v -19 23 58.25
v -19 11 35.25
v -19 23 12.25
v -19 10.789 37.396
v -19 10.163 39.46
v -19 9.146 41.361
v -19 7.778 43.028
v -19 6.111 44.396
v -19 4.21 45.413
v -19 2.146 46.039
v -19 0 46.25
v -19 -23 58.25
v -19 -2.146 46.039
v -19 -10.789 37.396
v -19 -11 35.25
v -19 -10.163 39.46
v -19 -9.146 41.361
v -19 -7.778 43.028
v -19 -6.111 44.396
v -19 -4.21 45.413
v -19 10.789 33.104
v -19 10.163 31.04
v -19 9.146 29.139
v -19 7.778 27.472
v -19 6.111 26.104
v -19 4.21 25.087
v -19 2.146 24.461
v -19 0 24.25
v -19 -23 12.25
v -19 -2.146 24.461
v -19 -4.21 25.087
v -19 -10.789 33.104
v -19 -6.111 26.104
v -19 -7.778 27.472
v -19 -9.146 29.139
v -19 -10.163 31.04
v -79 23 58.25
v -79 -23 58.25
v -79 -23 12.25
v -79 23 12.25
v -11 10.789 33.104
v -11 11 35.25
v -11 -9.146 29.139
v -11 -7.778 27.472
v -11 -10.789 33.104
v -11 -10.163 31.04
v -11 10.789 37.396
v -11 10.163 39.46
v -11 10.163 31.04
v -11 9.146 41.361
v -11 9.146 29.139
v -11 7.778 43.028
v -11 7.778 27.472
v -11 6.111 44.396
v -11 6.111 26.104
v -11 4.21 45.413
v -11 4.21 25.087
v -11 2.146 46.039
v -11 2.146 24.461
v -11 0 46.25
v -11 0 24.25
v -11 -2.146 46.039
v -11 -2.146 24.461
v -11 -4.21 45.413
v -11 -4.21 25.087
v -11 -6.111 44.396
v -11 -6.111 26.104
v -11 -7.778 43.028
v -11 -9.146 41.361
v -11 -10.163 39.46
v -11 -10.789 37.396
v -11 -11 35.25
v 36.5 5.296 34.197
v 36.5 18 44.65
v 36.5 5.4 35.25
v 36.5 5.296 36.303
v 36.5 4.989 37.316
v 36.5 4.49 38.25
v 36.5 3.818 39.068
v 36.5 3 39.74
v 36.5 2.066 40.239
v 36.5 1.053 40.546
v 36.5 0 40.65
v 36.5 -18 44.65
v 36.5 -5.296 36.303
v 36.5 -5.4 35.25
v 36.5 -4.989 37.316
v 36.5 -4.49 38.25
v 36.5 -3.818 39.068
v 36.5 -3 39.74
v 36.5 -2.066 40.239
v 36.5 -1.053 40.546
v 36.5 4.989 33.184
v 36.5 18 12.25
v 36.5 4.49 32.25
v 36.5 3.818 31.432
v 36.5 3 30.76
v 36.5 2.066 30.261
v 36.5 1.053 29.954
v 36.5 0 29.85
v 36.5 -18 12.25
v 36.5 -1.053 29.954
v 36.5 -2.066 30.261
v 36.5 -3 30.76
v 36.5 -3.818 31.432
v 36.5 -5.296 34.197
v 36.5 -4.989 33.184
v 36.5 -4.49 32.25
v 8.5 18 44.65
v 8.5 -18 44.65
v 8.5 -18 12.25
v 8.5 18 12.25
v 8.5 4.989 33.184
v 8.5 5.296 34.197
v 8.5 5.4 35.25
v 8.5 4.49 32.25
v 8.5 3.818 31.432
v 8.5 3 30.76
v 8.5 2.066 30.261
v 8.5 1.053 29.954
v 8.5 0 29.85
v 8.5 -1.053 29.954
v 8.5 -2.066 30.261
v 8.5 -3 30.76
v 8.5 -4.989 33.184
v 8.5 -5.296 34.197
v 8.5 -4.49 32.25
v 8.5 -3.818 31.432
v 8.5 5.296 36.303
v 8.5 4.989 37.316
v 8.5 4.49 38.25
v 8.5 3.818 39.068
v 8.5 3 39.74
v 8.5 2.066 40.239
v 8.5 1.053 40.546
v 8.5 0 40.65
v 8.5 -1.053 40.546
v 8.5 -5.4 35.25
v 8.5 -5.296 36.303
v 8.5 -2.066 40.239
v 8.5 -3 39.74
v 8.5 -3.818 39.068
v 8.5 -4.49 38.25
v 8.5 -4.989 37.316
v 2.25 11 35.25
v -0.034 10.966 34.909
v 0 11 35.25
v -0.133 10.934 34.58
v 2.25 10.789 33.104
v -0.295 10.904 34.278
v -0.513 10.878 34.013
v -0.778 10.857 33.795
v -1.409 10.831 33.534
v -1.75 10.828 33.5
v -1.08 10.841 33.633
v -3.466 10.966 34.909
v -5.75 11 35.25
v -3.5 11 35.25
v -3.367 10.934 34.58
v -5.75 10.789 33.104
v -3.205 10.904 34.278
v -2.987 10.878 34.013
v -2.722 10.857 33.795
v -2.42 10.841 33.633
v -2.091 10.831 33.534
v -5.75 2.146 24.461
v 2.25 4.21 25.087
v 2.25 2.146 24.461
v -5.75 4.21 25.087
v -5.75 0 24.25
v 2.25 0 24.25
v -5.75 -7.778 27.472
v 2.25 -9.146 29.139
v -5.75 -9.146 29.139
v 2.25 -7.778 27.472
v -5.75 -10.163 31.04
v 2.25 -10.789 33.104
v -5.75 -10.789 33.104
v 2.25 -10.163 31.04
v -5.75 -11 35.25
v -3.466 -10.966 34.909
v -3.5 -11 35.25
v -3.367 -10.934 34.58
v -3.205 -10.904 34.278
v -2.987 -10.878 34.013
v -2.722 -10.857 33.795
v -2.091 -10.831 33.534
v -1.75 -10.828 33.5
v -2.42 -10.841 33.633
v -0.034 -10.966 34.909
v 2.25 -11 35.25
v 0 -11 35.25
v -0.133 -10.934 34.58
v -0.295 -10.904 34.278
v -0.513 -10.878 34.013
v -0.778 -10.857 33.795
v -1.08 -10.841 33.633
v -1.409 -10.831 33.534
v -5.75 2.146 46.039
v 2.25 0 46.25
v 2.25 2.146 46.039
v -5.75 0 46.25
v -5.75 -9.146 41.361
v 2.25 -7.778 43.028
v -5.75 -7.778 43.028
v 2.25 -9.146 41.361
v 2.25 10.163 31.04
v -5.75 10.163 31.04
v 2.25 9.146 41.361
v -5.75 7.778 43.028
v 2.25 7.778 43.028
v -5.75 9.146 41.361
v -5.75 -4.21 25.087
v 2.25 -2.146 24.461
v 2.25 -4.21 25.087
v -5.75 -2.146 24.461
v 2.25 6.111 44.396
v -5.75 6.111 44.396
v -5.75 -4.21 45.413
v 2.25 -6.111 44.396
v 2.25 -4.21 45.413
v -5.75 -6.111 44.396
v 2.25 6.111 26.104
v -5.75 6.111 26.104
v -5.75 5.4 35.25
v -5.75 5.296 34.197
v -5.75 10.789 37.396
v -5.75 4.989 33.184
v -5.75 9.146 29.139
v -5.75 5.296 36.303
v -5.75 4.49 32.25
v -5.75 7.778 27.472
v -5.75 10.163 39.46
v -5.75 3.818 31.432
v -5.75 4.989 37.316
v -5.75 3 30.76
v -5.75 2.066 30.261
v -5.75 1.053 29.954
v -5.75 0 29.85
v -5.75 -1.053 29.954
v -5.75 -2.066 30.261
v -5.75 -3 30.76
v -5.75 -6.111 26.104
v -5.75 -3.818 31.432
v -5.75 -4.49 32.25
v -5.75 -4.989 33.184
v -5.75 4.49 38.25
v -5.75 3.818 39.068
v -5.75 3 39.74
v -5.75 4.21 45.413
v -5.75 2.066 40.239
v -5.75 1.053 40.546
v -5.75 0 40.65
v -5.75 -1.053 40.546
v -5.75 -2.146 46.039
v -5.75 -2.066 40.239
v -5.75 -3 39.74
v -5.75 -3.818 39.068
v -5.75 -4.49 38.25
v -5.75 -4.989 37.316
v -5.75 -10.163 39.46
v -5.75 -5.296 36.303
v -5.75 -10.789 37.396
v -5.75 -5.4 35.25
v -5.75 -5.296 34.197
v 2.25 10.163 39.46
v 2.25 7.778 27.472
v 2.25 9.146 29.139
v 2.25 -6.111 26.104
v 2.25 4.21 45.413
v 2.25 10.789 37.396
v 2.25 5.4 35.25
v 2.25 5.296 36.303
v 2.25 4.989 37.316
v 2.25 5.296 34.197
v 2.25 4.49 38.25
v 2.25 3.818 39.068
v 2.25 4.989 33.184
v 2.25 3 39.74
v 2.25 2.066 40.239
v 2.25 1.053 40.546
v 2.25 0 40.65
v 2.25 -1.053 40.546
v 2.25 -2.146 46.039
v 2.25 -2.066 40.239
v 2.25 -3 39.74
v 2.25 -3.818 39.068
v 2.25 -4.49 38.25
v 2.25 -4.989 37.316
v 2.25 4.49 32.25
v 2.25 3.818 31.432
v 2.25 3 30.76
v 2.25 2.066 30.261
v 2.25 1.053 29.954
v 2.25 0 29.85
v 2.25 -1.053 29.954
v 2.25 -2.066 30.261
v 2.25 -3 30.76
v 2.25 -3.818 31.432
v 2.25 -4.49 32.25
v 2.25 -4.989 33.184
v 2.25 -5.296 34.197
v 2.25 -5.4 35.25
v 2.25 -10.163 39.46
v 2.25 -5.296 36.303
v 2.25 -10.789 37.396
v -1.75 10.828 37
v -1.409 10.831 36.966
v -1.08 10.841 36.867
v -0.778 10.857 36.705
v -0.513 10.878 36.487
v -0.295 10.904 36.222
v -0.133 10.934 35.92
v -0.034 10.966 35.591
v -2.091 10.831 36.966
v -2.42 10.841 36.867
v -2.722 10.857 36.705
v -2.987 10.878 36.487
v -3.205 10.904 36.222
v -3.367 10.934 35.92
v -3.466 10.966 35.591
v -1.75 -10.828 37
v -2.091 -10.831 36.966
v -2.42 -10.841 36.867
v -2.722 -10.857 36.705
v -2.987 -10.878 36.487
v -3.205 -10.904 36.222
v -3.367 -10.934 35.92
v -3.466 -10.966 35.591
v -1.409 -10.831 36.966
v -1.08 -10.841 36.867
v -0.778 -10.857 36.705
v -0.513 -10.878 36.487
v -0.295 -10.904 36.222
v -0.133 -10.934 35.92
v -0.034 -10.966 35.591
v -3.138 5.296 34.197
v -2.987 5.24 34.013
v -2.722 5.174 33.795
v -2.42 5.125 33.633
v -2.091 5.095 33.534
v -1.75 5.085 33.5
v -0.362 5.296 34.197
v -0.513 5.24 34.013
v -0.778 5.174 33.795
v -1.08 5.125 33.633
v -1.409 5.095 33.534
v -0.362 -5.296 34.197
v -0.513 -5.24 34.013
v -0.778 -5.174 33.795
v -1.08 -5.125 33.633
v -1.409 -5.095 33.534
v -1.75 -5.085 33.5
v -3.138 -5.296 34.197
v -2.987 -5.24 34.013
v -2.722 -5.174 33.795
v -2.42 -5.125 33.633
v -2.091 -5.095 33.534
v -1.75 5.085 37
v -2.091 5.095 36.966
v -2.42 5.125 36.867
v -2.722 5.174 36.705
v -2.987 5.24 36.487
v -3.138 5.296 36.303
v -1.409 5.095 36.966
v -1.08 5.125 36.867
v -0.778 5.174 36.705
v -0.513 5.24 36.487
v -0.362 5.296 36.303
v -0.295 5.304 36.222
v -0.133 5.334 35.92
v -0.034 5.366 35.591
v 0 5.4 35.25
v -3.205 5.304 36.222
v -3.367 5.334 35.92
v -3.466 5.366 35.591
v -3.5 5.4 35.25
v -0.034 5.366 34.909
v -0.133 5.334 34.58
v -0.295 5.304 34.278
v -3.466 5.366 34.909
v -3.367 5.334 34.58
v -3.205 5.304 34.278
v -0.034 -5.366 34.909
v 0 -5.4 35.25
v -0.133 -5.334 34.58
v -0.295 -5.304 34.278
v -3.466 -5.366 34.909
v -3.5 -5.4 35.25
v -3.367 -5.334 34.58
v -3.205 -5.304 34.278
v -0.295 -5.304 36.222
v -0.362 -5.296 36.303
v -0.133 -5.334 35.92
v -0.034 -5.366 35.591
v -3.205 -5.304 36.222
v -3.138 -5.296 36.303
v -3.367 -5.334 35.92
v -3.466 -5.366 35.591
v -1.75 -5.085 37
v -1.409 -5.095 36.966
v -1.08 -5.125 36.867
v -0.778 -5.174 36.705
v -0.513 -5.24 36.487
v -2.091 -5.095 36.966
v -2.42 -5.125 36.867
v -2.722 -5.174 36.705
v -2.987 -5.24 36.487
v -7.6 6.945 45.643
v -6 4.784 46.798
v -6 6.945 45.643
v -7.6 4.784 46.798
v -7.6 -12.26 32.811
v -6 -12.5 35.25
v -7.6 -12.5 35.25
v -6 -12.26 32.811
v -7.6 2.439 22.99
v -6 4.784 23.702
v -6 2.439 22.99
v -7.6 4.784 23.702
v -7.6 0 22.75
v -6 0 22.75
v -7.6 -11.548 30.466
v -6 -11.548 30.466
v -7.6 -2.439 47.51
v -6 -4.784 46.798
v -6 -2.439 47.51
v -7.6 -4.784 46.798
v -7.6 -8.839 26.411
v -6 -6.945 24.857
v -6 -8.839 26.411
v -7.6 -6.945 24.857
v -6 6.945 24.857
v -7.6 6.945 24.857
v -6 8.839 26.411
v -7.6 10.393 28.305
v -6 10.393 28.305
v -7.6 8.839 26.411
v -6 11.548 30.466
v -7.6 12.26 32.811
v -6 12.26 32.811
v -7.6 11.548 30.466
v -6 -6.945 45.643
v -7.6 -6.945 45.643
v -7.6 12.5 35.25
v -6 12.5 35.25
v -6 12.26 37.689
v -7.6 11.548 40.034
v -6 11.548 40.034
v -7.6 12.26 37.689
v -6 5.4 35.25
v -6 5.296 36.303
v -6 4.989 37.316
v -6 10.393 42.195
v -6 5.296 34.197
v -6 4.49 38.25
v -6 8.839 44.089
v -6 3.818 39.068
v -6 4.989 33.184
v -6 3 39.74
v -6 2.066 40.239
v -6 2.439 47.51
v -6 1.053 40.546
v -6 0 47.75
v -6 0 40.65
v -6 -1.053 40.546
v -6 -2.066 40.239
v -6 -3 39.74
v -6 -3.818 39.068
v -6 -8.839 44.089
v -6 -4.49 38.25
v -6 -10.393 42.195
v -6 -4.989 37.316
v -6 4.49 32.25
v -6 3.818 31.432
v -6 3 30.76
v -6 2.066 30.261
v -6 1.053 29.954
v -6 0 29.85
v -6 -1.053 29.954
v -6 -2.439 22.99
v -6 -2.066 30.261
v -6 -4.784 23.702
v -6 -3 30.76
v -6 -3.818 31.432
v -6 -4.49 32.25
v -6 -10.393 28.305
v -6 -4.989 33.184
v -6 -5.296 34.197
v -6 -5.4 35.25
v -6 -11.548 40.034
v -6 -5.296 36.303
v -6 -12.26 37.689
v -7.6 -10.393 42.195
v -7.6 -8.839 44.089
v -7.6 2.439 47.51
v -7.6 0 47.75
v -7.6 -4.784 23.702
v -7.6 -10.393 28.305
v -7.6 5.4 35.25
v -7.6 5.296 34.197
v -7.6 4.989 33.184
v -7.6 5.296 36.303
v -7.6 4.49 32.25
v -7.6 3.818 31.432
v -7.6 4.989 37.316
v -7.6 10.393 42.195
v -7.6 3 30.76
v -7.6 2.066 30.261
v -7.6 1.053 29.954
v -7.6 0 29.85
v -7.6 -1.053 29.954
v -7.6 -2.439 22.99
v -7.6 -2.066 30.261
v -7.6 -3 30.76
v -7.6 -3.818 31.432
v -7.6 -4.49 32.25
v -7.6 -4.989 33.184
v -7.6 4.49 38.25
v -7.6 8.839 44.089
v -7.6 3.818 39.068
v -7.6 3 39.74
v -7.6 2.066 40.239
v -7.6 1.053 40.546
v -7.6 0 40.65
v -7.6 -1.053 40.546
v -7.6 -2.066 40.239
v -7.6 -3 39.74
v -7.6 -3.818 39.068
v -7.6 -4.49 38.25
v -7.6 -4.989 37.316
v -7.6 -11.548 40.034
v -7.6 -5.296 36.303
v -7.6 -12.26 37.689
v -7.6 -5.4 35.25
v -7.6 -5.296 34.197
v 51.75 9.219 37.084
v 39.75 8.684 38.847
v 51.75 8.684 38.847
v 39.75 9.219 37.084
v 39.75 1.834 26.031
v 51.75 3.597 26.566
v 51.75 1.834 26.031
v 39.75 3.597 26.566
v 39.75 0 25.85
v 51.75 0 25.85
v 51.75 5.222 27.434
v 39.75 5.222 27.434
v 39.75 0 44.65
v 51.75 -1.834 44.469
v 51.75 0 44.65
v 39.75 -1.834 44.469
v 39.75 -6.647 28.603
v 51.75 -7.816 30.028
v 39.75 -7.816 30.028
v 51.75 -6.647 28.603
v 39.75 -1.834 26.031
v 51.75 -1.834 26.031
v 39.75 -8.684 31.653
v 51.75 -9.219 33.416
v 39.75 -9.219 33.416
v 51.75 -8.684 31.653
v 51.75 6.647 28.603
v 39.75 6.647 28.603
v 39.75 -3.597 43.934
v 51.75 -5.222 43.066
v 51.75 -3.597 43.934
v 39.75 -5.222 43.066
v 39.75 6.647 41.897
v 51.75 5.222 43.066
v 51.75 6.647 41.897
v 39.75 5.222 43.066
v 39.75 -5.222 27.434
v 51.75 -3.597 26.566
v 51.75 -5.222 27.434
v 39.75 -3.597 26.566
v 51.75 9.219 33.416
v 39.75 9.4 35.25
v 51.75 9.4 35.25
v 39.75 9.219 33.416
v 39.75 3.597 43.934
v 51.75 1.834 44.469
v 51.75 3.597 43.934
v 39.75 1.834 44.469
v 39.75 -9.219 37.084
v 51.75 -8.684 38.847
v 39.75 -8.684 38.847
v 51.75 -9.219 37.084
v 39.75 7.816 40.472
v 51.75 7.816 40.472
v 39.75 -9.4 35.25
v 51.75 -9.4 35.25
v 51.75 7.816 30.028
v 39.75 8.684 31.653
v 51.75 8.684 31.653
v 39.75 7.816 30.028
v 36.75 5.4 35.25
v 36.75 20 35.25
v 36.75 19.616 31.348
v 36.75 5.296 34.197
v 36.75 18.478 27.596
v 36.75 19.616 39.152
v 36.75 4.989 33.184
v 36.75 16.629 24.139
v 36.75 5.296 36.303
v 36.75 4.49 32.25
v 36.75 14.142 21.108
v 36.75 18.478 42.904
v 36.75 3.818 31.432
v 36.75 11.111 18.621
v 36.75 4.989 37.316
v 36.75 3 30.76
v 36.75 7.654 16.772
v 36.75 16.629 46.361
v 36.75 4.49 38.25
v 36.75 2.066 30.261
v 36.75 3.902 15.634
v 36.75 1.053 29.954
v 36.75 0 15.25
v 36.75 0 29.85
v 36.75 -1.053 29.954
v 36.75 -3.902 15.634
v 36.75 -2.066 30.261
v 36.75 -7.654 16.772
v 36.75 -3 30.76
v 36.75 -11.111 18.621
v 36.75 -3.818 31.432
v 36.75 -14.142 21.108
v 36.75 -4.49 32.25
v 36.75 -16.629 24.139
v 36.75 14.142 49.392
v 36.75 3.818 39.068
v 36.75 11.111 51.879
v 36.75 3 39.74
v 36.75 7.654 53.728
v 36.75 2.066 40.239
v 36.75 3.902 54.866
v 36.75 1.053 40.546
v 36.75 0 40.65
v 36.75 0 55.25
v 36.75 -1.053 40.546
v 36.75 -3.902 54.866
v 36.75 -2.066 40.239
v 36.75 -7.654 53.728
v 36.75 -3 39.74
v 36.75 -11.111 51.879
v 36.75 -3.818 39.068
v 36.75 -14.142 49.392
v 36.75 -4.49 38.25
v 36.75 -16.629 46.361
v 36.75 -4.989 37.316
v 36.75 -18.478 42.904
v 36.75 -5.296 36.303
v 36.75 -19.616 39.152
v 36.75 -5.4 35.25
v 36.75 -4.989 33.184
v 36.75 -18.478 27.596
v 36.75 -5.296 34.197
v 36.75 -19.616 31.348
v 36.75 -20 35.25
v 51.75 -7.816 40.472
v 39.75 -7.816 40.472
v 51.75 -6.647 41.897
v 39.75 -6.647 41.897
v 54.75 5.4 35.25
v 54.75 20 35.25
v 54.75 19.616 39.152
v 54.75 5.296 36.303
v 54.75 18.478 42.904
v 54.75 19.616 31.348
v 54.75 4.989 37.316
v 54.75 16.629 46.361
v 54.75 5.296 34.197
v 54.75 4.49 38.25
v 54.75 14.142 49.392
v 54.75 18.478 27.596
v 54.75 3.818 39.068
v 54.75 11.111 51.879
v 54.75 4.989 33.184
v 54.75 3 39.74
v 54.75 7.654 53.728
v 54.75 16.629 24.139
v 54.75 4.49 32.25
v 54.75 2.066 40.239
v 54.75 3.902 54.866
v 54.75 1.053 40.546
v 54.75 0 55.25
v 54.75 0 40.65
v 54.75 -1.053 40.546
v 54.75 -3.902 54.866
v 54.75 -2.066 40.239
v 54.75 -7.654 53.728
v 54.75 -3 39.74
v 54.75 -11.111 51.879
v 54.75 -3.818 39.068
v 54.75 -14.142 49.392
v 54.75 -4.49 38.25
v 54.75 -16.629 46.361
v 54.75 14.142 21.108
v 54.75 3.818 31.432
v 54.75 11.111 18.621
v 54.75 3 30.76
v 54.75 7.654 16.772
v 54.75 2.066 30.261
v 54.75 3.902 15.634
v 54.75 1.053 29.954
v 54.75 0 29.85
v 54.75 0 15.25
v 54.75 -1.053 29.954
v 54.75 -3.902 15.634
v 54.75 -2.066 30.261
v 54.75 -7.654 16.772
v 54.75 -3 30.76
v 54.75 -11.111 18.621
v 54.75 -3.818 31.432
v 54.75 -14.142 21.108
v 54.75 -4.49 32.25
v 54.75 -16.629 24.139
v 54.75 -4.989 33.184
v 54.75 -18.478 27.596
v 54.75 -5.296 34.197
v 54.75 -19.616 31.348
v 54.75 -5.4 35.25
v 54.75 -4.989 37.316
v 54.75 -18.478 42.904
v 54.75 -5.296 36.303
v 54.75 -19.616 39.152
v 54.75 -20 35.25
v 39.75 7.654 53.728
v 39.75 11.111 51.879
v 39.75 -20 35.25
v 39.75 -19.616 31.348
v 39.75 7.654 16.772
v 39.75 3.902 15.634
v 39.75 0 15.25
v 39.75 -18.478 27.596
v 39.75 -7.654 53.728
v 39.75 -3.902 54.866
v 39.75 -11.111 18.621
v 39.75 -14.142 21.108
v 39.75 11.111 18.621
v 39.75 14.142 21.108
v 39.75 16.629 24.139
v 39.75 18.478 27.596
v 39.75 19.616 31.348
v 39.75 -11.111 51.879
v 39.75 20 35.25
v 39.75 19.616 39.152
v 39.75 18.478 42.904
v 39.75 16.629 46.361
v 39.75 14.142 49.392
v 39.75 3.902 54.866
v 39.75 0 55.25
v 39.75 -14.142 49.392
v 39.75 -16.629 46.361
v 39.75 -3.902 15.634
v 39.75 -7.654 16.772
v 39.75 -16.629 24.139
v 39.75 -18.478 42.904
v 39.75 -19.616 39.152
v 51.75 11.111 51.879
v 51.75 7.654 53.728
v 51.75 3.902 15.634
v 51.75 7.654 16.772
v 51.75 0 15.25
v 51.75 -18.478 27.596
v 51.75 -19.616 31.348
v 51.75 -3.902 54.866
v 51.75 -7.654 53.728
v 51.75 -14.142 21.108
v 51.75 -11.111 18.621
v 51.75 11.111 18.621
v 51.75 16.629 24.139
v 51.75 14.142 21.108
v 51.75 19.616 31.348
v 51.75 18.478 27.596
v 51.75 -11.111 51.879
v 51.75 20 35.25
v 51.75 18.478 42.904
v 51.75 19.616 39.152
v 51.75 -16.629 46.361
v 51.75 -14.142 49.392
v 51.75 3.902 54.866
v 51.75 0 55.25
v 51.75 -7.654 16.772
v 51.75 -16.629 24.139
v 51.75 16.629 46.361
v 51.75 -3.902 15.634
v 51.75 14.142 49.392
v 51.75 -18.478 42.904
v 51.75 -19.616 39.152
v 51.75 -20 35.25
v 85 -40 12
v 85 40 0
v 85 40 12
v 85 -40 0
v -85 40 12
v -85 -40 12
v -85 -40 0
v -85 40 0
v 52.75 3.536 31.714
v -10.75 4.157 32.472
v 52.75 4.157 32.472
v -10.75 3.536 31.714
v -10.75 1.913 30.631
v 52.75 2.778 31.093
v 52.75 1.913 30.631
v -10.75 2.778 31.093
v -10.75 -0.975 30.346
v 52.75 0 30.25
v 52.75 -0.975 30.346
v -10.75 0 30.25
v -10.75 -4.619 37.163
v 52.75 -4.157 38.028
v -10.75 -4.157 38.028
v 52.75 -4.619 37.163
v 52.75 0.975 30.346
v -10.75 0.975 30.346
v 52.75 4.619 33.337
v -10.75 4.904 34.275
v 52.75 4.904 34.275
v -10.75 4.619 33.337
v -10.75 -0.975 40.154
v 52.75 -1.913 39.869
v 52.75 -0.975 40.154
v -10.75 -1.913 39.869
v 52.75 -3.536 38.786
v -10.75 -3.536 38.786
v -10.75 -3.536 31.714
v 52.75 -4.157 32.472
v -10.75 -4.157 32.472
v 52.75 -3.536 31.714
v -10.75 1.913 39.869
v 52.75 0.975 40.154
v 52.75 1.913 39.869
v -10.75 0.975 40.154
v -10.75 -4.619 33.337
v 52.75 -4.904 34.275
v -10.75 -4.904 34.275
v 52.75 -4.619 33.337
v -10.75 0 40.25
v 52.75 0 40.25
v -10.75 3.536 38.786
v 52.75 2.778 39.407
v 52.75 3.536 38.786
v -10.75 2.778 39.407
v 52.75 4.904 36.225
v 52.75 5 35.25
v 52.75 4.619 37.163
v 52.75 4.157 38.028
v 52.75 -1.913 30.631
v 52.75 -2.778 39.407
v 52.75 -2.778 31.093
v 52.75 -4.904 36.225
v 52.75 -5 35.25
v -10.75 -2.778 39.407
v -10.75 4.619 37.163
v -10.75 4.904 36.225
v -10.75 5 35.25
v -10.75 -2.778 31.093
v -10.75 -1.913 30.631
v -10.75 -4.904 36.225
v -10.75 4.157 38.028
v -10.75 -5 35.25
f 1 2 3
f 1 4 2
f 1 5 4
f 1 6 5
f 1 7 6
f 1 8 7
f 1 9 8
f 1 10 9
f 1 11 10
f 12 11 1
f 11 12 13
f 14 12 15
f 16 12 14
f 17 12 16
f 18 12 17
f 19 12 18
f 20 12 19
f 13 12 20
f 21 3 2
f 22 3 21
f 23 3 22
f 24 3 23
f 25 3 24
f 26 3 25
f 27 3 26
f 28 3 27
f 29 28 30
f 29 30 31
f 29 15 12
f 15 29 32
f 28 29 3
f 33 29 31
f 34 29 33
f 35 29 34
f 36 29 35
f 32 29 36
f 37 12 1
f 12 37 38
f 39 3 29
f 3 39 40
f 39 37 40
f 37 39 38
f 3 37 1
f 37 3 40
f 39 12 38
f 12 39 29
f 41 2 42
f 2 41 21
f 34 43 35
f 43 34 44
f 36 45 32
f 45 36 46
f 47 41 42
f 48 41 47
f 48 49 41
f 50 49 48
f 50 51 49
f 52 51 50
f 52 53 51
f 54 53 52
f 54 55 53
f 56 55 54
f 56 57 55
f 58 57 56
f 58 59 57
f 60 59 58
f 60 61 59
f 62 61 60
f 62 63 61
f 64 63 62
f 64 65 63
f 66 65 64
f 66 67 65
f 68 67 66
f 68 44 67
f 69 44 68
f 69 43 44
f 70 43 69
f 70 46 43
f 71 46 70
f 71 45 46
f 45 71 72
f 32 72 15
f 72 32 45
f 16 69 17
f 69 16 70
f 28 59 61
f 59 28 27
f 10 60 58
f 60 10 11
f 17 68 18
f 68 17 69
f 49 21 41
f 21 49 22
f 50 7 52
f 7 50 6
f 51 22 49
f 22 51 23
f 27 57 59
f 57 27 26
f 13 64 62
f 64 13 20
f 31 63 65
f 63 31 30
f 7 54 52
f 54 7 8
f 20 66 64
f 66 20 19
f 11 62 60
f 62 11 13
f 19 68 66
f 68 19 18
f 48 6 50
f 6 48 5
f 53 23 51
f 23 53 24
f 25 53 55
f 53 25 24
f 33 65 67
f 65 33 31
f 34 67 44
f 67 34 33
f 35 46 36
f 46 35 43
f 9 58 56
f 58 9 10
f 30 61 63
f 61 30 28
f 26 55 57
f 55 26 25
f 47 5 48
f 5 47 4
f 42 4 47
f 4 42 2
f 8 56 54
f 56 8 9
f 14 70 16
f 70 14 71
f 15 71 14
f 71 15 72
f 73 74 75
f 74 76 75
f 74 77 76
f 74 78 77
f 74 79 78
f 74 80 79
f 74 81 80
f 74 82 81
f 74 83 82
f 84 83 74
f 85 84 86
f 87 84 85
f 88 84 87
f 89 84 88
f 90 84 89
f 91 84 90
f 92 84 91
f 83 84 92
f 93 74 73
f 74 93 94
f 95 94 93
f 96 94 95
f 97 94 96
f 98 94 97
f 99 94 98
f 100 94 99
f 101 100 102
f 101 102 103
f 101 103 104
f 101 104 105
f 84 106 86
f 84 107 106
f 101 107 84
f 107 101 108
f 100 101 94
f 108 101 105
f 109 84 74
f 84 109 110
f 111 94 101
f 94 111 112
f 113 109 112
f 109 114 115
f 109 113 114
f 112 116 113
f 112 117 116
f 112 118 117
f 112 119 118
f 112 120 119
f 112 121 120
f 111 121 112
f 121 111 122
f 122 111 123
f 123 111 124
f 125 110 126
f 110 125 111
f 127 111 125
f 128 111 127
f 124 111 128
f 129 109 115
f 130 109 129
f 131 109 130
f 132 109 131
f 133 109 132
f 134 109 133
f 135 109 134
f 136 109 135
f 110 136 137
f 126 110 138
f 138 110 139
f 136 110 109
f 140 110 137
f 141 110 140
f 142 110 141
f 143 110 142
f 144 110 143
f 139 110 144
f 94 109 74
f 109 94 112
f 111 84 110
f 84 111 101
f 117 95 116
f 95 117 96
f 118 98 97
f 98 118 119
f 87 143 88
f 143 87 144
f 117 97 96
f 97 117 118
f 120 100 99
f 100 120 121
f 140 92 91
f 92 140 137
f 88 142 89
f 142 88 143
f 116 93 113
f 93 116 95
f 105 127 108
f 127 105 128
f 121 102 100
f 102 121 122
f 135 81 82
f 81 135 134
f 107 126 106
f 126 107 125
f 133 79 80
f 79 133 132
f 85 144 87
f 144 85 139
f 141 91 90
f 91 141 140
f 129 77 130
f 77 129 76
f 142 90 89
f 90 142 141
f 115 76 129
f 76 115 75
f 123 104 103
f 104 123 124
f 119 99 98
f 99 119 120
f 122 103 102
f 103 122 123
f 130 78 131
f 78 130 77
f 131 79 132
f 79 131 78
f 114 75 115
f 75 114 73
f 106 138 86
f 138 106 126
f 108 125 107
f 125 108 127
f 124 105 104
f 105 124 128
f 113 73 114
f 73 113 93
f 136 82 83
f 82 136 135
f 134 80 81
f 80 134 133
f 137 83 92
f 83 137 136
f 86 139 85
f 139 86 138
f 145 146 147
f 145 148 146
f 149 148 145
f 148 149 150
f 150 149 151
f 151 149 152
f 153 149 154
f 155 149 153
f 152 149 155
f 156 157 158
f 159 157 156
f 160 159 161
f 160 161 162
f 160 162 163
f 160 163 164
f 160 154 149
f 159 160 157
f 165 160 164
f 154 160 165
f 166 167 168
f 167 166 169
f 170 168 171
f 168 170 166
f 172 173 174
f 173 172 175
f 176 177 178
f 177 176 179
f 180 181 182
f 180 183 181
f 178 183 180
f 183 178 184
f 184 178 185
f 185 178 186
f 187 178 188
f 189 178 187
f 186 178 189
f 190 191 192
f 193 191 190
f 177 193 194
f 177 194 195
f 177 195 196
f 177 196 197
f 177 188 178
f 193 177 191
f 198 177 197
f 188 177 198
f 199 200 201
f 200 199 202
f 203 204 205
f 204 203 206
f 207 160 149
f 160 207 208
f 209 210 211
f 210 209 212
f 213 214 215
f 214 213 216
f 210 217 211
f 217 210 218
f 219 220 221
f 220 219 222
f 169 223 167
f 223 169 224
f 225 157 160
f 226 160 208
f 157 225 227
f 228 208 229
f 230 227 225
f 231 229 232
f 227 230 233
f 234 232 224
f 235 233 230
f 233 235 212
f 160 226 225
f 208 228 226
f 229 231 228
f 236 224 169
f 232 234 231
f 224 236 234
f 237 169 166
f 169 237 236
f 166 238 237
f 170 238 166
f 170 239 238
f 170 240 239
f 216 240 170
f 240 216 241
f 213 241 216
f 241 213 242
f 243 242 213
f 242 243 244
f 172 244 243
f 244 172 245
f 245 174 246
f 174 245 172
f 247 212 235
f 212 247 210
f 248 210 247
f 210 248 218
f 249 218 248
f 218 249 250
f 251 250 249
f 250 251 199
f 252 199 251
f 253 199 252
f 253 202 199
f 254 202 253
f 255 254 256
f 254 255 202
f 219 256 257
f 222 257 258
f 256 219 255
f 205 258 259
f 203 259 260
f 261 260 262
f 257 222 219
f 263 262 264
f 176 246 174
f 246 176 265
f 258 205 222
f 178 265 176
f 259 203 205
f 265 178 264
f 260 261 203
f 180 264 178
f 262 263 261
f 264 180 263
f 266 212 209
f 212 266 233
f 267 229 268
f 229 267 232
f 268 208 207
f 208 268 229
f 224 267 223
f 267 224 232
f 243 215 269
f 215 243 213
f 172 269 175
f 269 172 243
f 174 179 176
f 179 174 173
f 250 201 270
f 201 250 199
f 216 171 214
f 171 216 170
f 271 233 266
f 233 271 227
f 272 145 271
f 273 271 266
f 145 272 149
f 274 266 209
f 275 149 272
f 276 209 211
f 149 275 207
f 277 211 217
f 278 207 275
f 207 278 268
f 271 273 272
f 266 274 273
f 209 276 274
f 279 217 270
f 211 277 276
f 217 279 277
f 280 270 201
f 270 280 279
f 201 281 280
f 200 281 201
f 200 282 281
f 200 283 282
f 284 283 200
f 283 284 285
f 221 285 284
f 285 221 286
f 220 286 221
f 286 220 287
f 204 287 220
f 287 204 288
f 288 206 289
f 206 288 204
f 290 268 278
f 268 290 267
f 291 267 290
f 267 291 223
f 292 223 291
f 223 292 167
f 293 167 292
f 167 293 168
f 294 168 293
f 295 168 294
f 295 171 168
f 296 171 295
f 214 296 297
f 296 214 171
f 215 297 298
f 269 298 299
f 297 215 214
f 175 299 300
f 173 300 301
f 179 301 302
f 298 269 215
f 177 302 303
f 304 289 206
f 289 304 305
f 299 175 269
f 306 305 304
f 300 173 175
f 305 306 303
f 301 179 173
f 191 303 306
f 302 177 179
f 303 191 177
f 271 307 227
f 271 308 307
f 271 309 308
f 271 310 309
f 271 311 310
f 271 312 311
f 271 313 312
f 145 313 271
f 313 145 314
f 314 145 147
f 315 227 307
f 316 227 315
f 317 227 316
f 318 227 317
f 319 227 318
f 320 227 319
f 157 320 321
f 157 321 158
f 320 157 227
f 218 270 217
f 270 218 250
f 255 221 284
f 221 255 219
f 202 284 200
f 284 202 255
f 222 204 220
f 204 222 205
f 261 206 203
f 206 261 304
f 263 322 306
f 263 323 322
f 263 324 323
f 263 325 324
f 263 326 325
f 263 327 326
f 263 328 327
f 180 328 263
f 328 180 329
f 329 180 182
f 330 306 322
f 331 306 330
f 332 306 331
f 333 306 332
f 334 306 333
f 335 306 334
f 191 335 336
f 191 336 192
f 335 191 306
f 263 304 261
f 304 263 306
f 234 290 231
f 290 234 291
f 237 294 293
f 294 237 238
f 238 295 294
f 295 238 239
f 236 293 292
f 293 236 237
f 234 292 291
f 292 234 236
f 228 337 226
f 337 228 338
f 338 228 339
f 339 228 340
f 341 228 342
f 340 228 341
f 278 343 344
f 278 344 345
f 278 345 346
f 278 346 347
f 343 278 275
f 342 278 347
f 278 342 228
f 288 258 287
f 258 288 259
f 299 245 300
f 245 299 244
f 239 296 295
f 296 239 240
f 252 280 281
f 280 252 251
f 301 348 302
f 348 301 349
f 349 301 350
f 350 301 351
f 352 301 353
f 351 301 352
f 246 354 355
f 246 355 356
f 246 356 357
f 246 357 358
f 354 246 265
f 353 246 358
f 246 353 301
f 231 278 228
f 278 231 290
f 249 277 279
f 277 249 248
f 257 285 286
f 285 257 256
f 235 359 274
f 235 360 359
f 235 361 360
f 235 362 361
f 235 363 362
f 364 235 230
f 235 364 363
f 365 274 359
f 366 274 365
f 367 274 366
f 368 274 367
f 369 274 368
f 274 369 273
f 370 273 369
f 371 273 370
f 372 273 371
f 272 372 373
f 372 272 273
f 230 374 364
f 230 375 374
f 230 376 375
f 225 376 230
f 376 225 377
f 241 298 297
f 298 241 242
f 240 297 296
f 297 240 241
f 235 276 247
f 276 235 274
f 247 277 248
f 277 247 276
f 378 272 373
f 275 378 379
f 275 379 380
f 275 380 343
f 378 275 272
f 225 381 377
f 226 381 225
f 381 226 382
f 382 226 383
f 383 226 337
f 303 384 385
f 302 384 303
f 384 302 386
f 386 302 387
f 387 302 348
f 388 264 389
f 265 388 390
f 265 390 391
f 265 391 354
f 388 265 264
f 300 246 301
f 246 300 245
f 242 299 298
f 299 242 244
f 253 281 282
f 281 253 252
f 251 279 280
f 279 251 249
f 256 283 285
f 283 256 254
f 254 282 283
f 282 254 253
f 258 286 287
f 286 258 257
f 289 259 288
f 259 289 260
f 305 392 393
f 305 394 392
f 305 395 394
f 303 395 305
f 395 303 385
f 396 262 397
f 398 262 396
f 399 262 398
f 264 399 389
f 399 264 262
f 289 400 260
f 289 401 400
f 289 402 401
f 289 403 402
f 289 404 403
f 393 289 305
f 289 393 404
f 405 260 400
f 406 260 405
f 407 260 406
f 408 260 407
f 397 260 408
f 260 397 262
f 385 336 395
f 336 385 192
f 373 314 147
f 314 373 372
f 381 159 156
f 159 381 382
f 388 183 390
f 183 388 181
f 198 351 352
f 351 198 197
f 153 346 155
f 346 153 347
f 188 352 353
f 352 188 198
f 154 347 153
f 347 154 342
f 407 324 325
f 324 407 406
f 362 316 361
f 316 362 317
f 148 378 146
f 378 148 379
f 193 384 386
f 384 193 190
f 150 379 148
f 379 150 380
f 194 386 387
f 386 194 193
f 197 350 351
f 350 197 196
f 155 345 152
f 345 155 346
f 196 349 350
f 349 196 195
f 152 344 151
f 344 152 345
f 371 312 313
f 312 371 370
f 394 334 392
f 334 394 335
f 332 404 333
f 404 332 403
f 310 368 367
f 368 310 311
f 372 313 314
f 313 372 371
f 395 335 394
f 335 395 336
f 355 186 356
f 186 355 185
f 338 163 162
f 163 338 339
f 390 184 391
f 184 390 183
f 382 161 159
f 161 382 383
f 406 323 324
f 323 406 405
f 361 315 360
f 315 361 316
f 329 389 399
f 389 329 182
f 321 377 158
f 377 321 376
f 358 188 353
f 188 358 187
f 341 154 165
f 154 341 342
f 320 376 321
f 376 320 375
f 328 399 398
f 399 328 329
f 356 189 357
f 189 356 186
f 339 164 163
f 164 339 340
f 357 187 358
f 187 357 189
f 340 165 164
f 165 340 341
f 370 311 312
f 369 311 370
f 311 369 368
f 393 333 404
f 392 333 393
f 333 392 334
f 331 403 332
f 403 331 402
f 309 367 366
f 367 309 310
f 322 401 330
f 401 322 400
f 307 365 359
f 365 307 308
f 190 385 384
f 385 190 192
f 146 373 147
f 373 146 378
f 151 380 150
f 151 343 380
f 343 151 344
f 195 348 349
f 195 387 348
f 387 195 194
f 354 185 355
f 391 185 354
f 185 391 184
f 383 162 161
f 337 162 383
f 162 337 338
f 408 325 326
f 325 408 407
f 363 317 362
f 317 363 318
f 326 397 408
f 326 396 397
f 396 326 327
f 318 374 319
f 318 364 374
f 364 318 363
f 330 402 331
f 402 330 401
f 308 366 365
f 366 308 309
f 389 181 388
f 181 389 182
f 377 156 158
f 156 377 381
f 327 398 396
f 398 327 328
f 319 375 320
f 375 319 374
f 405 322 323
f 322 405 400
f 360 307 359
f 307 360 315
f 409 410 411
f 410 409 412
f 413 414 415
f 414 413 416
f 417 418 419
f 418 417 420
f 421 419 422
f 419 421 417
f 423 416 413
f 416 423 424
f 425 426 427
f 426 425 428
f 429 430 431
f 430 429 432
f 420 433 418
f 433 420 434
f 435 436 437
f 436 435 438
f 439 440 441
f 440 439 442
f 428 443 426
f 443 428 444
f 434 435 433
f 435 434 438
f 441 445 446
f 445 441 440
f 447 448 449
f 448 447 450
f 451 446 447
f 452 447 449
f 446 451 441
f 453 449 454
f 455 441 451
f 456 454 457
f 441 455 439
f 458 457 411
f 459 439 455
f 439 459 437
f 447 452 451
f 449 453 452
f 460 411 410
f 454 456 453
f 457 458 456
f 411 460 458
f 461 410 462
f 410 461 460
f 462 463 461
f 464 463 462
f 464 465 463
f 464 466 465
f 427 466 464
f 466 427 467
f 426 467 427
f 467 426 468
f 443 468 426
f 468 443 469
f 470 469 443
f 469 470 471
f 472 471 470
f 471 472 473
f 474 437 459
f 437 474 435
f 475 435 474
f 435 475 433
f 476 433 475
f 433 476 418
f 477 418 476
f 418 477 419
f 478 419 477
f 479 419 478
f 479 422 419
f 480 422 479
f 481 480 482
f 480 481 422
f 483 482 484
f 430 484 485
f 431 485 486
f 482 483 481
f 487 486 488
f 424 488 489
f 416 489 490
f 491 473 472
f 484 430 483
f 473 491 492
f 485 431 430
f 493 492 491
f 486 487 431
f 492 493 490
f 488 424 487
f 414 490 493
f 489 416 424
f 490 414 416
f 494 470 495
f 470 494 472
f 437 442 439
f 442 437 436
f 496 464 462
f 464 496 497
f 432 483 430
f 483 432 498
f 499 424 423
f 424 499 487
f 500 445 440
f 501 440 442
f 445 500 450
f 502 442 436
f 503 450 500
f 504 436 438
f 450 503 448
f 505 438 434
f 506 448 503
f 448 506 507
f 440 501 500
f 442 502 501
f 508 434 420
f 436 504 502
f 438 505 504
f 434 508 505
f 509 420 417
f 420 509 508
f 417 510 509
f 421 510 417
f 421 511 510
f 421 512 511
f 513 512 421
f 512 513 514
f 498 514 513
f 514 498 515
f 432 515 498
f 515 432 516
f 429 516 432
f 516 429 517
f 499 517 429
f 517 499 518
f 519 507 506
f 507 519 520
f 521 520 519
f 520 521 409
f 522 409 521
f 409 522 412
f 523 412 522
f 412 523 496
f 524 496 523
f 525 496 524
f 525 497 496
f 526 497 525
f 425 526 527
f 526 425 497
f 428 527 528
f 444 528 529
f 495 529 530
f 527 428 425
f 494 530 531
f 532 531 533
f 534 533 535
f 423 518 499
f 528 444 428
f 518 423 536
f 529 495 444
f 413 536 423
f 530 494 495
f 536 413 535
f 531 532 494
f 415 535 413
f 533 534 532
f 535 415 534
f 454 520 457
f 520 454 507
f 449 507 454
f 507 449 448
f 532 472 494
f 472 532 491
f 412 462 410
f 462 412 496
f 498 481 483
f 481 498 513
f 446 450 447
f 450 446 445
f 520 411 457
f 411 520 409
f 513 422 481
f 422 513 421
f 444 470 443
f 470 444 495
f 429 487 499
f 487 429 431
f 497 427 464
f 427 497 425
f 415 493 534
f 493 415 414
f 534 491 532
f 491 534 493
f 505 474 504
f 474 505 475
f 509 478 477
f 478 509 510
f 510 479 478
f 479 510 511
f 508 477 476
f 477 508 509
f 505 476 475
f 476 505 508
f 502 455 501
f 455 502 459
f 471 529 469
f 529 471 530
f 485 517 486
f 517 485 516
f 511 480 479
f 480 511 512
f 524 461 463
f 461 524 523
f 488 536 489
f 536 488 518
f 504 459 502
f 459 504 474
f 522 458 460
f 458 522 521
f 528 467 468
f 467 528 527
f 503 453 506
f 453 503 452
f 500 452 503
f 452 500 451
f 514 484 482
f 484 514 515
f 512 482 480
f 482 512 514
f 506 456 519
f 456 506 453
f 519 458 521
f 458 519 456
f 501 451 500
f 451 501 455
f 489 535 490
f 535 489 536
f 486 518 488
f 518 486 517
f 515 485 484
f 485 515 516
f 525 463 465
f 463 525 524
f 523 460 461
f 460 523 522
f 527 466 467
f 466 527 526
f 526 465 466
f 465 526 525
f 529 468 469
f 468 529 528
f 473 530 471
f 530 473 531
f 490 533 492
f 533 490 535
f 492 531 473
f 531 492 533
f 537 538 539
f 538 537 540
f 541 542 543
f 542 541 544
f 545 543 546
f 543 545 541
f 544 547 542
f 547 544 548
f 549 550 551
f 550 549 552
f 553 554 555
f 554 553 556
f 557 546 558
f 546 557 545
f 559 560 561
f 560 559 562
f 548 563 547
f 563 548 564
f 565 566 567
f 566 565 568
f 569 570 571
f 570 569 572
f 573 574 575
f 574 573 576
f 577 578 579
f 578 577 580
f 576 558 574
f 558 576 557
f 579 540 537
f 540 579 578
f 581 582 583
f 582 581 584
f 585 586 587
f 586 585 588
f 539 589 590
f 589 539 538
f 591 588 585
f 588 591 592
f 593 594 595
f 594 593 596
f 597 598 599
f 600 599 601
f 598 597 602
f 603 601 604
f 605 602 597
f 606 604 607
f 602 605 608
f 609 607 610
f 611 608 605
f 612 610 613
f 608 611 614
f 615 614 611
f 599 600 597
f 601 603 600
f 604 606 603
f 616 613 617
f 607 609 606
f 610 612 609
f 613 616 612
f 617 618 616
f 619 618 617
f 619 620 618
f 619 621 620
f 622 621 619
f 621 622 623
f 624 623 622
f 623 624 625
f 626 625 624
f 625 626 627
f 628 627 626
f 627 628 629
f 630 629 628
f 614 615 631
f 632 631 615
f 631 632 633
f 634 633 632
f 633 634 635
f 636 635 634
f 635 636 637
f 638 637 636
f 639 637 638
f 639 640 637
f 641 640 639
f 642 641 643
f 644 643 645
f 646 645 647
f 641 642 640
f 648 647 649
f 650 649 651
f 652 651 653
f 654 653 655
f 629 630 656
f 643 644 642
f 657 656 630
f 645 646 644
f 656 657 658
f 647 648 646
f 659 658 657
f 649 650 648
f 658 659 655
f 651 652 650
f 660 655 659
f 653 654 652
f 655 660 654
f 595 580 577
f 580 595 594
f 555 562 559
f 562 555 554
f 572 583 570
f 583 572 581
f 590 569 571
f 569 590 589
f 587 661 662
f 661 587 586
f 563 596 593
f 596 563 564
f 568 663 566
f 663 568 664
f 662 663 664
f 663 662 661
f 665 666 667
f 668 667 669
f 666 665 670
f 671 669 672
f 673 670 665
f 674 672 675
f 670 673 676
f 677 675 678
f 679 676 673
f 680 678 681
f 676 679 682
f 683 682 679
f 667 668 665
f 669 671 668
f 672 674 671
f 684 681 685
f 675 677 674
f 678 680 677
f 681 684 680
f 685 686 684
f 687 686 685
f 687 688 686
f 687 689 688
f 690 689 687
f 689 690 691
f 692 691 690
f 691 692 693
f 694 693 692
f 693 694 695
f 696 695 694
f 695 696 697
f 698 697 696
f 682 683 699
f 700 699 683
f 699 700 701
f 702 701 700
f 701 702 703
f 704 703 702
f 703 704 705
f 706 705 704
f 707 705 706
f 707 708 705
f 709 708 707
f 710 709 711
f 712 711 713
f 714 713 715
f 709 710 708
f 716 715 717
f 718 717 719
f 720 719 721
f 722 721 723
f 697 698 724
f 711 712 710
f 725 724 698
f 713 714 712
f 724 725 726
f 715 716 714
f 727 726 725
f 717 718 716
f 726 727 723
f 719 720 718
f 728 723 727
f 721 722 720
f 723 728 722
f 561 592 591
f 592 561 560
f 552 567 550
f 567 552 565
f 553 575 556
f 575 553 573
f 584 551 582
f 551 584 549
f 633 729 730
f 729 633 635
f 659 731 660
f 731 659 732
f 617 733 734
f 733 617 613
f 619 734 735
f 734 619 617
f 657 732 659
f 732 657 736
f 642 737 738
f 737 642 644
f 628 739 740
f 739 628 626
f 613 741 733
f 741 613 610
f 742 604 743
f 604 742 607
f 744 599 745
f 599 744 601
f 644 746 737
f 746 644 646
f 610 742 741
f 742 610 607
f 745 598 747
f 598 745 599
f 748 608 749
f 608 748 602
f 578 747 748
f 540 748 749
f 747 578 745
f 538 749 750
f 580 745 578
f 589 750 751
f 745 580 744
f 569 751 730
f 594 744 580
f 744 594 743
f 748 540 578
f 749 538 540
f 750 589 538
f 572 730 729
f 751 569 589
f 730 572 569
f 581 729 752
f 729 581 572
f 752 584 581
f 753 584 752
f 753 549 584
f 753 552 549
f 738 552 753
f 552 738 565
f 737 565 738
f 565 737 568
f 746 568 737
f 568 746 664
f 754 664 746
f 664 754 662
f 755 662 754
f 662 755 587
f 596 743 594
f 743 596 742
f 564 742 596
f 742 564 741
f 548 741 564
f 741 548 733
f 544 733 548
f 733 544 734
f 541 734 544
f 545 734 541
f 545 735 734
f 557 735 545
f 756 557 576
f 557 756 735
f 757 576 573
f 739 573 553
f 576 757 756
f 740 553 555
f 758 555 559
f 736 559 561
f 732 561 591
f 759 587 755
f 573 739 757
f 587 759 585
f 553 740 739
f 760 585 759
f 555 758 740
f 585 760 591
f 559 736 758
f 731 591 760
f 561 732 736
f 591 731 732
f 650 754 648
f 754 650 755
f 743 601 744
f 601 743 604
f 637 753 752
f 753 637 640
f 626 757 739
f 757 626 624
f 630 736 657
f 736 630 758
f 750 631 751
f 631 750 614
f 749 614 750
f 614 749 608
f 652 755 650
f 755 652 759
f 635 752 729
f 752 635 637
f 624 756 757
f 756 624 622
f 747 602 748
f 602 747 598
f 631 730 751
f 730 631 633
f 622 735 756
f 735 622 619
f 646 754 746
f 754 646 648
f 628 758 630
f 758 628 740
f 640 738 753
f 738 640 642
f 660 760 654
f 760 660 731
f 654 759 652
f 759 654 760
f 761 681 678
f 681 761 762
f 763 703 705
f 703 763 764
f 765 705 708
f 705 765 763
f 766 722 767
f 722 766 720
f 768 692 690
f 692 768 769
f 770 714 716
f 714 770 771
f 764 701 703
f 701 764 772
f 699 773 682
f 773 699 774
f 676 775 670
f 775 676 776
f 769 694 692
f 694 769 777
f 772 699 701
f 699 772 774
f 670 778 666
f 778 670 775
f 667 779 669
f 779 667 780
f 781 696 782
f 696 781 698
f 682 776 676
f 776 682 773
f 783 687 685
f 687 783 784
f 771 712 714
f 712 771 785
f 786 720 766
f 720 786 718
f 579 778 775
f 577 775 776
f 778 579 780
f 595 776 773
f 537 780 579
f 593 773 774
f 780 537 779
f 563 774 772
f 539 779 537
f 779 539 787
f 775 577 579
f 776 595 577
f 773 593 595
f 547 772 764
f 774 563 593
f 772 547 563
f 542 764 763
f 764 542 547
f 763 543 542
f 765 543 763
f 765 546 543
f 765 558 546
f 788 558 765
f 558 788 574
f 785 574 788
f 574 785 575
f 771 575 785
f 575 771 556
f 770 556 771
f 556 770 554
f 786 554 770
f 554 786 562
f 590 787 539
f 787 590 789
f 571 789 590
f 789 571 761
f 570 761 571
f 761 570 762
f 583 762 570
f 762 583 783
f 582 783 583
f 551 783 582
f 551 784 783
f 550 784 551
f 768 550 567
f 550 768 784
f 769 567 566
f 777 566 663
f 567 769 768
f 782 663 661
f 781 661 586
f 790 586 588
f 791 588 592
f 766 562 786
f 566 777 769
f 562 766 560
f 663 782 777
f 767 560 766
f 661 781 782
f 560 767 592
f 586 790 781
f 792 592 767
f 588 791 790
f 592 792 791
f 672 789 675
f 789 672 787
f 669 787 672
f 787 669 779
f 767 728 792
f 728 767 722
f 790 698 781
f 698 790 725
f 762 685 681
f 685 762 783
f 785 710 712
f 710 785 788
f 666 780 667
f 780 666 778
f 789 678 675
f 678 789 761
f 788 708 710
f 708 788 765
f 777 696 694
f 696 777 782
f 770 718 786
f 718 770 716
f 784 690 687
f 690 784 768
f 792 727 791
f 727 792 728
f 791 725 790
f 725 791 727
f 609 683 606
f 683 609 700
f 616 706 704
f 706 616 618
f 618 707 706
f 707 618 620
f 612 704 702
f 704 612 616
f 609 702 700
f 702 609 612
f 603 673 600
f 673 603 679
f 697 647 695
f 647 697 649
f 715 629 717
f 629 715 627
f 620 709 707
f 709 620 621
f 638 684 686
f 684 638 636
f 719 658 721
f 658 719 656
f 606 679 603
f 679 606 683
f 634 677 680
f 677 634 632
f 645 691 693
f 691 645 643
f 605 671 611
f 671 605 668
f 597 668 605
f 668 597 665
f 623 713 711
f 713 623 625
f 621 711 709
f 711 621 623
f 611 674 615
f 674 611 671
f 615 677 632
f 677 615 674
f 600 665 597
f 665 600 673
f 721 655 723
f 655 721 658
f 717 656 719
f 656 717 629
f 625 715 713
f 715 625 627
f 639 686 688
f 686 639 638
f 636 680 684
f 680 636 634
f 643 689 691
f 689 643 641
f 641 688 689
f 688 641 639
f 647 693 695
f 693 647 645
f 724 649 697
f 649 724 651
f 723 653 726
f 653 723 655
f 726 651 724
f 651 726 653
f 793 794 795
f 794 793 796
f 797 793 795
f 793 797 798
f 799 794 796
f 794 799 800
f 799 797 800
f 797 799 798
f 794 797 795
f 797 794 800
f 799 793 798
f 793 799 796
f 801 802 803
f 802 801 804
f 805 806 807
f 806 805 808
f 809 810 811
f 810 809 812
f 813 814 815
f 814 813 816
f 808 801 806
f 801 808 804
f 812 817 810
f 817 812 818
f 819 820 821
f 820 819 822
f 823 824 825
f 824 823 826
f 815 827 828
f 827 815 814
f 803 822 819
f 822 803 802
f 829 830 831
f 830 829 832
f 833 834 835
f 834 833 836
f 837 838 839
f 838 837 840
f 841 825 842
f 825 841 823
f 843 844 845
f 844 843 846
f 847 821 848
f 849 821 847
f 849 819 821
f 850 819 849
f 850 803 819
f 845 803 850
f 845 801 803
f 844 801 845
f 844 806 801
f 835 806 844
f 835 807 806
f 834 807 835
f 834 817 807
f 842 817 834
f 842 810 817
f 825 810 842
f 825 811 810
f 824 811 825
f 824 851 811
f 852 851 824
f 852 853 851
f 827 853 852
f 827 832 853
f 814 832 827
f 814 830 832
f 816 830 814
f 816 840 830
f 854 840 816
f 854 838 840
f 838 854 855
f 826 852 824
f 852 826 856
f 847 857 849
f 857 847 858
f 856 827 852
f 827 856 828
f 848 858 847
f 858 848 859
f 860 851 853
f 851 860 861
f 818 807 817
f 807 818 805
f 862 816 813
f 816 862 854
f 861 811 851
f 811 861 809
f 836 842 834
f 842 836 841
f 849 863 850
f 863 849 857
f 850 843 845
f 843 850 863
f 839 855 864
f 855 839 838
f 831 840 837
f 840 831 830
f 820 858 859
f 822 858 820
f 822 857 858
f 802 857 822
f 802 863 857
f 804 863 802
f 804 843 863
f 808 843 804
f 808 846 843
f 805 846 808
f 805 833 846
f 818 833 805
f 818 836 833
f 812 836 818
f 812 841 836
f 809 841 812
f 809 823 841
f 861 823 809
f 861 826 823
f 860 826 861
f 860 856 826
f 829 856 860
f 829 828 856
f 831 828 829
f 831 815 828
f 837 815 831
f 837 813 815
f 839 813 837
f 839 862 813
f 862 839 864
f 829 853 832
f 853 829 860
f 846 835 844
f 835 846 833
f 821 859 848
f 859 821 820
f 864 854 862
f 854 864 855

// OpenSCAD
$fn = 32;

// ------------------------------------------------------------------------
// Motor drive station: motor 60 x 46 mm, shaft d10, pulley d40
// Every part is its own module, assembly() places every instance.
// ------------------------------------------------------------------------

// --- part 1 ---
module station_bed() {
  difference() {
    translate([-85, -40, 0]) cube([170, 80, 12]);
  }
}

// --- part 2 ---
module drive_motor() {
  union() {
    translate([-30, -23, 0]) cube([60, 46, 46]);
    translate([34, 0, 23]) rotate([0, 90, 0]) cylinder(h = 8, d = 22, center = true);
  }
}

// --- part 3 ---
module pillow_block() {
  difference() {
    translate([-14, -18, 0]) cube([28, 36, 32.4]);
    translate([0, 0, 23]) rotate([0, 90, 0]) cylinder(h = 30, d = 10.8, center = true);
  }
}

// --- part 4 ---
module drive_shaft() {
  translate([0, 0, -31.75]) cylinder(h = 63.5, d = 10);
}

// --- part 5 ---
module shaft_collar() {
  difference() {
    cylinder(h = 8, d = 22);
    translate([0, 0, -1]) cylinder(h = 10, d = 10.8);
    translate([0, 0, 4]) rotate([90, 0, 0]) cylinder(h = 24, d = 3.5, center = true);
  }
}

// --- part 6 ---
module collar_washer() {
  difference() {
      translate([0, 0, 0]) cylinder(h = 1.6, d = 25);
      translate([0, 0, -1]) cylinder(h = 3.6, d = 10.8);
    }
}

// --- part 7 ---
module drive_pulley() {
  difference() {
    union() {
      cylinder(h = 18, d = 18.8);
      cylinder(h = 3, d = 40);
      translate([0, 0, 15]) cylinder(h = 3, d = 40);
    }
    translate([0, 0, -1]) cylinder(h = 20, d = 10.8);
  }
}

// --- assembly ---
module assembly() {
  color([0.80, 0.24, 0.20]) translate([0, 0, 0]) rotate([0, 0, 0]) station_bed();
  color([0.20, 0.45, 0.75]) translate([-49, 0, 12.25]) rotate([0, 0, 0]) drive_motor();
  color([0.25, 0.62, 0.32]) translate([22.5, 0, 12.25]) rotate([0, 0, 0]) pillow_block();
  color([0.92, 0.70, 0.18]) translate([21, 0, 35.25]) rotate([0, 90, 0]) drive_shaft();
  color([0.58, 0.35, 0.70]) translate([-5.75, 0, 35.25]) rotate([0, 90, 0]) shaft_collar();
  color([0.16, 0.66, 0.66]) translate([-7.6, 0, 35.25]) rotate([0, 90, 0]) collar_washer();
  color([0.85, 0.48, 0.18]) translate([36.75, 0, 35.25]) rotate([0, 90, 0]) drive_pulley();
}

assembly();
